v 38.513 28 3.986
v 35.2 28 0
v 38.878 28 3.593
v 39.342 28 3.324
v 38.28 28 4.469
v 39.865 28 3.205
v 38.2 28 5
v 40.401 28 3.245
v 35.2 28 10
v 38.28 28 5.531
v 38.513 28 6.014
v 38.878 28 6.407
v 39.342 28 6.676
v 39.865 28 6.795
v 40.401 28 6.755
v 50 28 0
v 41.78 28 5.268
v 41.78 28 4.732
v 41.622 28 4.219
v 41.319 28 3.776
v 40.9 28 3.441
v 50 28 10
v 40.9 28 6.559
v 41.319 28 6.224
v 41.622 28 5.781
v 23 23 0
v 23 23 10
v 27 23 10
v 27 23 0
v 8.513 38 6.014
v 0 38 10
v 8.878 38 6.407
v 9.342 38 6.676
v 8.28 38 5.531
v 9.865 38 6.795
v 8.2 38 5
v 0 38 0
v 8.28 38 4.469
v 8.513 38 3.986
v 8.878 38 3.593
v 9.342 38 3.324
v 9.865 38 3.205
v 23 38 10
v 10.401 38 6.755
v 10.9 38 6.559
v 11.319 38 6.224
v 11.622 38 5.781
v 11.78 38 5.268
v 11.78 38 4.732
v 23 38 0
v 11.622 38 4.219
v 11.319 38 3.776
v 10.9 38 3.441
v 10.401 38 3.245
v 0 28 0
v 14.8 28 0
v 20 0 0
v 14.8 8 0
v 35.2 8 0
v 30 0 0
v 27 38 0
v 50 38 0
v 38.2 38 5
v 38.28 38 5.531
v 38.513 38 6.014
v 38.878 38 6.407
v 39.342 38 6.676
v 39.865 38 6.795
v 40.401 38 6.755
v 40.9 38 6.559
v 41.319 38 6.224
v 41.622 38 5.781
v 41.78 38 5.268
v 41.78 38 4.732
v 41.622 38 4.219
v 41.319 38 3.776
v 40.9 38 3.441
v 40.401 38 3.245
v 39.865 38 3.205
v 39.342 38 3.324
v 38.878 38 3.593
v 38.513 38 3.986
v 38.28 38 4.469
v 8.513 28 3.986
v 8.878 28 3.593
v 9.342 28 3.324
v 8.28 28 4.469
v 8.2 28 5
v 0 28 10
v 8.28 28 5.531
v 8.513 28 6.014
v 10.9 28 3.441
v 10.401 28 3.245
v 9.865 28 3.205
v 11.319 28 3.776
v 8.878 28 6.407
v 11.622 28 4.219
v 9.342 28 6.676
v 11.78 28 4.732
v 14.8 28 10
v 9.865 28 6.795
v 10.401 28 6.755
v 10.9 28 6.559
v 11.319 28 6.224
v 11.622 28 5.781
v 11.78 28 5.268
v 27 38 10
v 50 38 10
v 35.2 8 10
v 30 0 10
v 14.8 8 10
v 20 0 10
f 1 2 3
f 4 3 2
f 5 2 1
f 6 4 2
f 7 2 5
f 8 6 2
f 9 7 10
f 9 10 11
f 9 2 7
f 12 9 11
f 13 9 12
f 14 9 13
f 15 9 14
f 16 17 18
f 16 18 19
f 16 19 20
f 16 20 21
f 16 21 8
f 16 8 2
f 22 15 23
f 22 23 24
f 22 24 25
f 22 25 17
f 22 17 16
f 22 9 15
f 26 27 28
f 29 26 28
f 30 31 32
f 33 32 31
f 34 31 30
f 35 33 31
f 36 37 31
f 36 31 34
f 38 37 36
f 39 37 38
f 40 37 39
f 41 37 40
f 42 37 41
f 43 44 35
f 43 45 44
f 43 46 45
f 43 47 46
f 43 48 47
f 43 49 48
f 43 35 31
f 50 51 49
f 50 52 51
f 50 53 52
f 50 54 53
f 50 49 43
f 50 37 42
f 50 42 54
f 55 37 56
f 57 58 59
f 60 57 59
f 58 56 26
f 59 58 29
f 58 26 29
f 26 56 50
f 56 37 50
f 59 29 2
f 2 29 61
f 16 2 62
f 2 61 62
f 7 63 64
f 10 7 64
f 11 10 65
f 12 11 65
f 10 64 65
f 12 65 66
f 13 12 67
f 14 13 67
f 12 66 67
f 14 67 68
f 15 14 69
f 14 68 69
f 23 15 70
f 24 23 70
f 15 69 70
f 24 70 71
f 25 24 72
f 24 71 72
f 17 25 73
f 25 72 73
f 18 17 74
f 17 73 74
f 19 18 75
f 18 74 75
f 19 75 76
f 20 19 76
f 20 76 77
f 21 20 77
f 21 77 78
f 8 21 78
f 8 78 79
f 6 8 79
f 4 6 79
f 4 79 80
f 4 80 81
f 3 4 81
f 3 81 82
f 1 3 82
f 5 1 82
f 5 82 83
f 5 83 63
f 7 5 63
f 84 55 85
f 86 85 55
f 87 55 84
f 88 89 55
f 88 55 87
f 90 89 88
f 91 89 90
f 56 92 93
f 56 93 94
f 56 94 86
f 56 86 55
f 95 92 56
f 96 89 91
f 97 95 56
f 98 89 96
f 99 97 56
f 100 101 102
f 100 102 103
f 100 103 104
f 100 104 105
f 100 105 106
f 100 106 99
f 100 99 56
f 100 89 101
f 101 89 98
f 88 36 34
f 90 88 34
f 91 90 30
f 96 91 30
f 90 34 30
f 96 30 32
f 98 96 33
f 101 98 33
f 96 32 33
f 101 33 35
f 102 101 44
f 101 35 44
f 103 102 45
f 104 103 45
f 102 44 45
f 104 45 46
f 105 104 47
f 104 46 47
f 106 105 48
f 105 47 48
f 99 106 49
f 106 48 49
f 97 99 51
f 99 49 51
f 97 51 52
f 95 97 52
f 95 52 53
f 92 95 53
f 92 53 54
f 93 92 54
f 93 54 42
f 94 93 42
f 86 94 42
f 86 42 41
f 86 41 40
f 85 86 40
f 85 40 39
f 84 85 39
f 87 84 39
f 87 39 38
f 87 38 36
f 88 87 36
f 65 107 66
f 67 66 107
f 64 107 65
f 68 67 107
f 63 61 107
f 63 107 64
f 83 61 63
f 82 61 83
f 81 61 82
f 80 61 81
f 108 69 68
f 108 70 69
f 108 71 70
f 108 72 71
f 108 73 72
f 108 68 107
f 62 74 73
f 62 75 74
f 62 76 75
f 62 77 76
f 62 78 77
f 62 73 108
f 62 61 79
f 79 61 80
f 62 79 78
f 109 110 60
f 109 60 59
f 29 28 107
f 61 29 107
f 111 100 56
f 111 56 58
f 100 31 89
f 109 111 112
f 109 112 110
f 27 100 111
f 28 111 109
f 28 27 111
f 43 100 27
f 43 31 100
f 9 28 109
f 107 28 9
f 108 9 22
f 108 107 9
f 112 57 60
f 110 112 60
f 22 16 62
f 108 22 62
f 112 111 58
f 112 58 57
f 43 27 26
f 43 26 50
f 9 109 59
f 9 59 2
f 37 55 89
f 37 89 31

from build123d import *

# Parameters (mm, degrees)
SKETCH1_W           = 50
SKETCH1_H           = 38
BOSS_EXTRUDE1_DEPTH = 10
SKETCH2_R           = 1.8
CUT_EXTRUDE1_DEPTH  = 64.592452382
SKETCH3_W           = 4
SKETCH3_H           = 15
CUT_EXTRUDE2_DEPTH  = 10
CUT_EXTRUDE3_DEPTH  = 64.592452382


with BuildPart() as part:
    # Sketch1 → Boss-Extrude1 (new body)
    with BuildSketch(Plane.XY):
        with Locations((25, 19)):
            Rectangle(SKETCH1_W, SKETCH1_H)
    extrude(amount=BOSS_EXTRUDE1_DEPTH)

    # Sketch2 → Cut-Extrude1 (cut, through all)
    with BuildSketch(Plane(origin=(0, 38, 0), x_dir=(1, 0, 0), z_dir=(0, 1, 0))):
        with Locations(Location((10, -5, 0), (0, 0, 180))):
            Circle(SKETCH2_R)
        with Locations(Location((40, -5, 0), (0, 0, 180))):
            Circle(SKETCH2_R)
    extrude(amount=-CUT_EXTRUDE1_DEPTH, mode=Mode.SUBTRACT)

    # Sketch3 → Cut-Extrude2 (cut)
    with BuildSketch(Plane.XY.offset(10)):
        with Locations((25, 30.5)):
            Rectangle(SKETCH3_W, SKETCH3_H)
    extrude(amount=-CUT_EXTRUDE2_DEPTH, mode=Mode.SUBTRACT)

    # Sketch4 → Cut-Extrude3 (cut, through all)
    with BuildSketch(Plane.XY.offset(10)):
        Polygon((0, 28), (14.8, 28), (14.8, 8), (20, 0), (30, 0), (35.2, 8), (35.2, 28), (50, 28), (50, -1), (0, -1), align=None)
    extrude(amount=-CUT_EXTRUDE3_DEPTH, mode=Mode.SUBTRACT)


solid = part.part
